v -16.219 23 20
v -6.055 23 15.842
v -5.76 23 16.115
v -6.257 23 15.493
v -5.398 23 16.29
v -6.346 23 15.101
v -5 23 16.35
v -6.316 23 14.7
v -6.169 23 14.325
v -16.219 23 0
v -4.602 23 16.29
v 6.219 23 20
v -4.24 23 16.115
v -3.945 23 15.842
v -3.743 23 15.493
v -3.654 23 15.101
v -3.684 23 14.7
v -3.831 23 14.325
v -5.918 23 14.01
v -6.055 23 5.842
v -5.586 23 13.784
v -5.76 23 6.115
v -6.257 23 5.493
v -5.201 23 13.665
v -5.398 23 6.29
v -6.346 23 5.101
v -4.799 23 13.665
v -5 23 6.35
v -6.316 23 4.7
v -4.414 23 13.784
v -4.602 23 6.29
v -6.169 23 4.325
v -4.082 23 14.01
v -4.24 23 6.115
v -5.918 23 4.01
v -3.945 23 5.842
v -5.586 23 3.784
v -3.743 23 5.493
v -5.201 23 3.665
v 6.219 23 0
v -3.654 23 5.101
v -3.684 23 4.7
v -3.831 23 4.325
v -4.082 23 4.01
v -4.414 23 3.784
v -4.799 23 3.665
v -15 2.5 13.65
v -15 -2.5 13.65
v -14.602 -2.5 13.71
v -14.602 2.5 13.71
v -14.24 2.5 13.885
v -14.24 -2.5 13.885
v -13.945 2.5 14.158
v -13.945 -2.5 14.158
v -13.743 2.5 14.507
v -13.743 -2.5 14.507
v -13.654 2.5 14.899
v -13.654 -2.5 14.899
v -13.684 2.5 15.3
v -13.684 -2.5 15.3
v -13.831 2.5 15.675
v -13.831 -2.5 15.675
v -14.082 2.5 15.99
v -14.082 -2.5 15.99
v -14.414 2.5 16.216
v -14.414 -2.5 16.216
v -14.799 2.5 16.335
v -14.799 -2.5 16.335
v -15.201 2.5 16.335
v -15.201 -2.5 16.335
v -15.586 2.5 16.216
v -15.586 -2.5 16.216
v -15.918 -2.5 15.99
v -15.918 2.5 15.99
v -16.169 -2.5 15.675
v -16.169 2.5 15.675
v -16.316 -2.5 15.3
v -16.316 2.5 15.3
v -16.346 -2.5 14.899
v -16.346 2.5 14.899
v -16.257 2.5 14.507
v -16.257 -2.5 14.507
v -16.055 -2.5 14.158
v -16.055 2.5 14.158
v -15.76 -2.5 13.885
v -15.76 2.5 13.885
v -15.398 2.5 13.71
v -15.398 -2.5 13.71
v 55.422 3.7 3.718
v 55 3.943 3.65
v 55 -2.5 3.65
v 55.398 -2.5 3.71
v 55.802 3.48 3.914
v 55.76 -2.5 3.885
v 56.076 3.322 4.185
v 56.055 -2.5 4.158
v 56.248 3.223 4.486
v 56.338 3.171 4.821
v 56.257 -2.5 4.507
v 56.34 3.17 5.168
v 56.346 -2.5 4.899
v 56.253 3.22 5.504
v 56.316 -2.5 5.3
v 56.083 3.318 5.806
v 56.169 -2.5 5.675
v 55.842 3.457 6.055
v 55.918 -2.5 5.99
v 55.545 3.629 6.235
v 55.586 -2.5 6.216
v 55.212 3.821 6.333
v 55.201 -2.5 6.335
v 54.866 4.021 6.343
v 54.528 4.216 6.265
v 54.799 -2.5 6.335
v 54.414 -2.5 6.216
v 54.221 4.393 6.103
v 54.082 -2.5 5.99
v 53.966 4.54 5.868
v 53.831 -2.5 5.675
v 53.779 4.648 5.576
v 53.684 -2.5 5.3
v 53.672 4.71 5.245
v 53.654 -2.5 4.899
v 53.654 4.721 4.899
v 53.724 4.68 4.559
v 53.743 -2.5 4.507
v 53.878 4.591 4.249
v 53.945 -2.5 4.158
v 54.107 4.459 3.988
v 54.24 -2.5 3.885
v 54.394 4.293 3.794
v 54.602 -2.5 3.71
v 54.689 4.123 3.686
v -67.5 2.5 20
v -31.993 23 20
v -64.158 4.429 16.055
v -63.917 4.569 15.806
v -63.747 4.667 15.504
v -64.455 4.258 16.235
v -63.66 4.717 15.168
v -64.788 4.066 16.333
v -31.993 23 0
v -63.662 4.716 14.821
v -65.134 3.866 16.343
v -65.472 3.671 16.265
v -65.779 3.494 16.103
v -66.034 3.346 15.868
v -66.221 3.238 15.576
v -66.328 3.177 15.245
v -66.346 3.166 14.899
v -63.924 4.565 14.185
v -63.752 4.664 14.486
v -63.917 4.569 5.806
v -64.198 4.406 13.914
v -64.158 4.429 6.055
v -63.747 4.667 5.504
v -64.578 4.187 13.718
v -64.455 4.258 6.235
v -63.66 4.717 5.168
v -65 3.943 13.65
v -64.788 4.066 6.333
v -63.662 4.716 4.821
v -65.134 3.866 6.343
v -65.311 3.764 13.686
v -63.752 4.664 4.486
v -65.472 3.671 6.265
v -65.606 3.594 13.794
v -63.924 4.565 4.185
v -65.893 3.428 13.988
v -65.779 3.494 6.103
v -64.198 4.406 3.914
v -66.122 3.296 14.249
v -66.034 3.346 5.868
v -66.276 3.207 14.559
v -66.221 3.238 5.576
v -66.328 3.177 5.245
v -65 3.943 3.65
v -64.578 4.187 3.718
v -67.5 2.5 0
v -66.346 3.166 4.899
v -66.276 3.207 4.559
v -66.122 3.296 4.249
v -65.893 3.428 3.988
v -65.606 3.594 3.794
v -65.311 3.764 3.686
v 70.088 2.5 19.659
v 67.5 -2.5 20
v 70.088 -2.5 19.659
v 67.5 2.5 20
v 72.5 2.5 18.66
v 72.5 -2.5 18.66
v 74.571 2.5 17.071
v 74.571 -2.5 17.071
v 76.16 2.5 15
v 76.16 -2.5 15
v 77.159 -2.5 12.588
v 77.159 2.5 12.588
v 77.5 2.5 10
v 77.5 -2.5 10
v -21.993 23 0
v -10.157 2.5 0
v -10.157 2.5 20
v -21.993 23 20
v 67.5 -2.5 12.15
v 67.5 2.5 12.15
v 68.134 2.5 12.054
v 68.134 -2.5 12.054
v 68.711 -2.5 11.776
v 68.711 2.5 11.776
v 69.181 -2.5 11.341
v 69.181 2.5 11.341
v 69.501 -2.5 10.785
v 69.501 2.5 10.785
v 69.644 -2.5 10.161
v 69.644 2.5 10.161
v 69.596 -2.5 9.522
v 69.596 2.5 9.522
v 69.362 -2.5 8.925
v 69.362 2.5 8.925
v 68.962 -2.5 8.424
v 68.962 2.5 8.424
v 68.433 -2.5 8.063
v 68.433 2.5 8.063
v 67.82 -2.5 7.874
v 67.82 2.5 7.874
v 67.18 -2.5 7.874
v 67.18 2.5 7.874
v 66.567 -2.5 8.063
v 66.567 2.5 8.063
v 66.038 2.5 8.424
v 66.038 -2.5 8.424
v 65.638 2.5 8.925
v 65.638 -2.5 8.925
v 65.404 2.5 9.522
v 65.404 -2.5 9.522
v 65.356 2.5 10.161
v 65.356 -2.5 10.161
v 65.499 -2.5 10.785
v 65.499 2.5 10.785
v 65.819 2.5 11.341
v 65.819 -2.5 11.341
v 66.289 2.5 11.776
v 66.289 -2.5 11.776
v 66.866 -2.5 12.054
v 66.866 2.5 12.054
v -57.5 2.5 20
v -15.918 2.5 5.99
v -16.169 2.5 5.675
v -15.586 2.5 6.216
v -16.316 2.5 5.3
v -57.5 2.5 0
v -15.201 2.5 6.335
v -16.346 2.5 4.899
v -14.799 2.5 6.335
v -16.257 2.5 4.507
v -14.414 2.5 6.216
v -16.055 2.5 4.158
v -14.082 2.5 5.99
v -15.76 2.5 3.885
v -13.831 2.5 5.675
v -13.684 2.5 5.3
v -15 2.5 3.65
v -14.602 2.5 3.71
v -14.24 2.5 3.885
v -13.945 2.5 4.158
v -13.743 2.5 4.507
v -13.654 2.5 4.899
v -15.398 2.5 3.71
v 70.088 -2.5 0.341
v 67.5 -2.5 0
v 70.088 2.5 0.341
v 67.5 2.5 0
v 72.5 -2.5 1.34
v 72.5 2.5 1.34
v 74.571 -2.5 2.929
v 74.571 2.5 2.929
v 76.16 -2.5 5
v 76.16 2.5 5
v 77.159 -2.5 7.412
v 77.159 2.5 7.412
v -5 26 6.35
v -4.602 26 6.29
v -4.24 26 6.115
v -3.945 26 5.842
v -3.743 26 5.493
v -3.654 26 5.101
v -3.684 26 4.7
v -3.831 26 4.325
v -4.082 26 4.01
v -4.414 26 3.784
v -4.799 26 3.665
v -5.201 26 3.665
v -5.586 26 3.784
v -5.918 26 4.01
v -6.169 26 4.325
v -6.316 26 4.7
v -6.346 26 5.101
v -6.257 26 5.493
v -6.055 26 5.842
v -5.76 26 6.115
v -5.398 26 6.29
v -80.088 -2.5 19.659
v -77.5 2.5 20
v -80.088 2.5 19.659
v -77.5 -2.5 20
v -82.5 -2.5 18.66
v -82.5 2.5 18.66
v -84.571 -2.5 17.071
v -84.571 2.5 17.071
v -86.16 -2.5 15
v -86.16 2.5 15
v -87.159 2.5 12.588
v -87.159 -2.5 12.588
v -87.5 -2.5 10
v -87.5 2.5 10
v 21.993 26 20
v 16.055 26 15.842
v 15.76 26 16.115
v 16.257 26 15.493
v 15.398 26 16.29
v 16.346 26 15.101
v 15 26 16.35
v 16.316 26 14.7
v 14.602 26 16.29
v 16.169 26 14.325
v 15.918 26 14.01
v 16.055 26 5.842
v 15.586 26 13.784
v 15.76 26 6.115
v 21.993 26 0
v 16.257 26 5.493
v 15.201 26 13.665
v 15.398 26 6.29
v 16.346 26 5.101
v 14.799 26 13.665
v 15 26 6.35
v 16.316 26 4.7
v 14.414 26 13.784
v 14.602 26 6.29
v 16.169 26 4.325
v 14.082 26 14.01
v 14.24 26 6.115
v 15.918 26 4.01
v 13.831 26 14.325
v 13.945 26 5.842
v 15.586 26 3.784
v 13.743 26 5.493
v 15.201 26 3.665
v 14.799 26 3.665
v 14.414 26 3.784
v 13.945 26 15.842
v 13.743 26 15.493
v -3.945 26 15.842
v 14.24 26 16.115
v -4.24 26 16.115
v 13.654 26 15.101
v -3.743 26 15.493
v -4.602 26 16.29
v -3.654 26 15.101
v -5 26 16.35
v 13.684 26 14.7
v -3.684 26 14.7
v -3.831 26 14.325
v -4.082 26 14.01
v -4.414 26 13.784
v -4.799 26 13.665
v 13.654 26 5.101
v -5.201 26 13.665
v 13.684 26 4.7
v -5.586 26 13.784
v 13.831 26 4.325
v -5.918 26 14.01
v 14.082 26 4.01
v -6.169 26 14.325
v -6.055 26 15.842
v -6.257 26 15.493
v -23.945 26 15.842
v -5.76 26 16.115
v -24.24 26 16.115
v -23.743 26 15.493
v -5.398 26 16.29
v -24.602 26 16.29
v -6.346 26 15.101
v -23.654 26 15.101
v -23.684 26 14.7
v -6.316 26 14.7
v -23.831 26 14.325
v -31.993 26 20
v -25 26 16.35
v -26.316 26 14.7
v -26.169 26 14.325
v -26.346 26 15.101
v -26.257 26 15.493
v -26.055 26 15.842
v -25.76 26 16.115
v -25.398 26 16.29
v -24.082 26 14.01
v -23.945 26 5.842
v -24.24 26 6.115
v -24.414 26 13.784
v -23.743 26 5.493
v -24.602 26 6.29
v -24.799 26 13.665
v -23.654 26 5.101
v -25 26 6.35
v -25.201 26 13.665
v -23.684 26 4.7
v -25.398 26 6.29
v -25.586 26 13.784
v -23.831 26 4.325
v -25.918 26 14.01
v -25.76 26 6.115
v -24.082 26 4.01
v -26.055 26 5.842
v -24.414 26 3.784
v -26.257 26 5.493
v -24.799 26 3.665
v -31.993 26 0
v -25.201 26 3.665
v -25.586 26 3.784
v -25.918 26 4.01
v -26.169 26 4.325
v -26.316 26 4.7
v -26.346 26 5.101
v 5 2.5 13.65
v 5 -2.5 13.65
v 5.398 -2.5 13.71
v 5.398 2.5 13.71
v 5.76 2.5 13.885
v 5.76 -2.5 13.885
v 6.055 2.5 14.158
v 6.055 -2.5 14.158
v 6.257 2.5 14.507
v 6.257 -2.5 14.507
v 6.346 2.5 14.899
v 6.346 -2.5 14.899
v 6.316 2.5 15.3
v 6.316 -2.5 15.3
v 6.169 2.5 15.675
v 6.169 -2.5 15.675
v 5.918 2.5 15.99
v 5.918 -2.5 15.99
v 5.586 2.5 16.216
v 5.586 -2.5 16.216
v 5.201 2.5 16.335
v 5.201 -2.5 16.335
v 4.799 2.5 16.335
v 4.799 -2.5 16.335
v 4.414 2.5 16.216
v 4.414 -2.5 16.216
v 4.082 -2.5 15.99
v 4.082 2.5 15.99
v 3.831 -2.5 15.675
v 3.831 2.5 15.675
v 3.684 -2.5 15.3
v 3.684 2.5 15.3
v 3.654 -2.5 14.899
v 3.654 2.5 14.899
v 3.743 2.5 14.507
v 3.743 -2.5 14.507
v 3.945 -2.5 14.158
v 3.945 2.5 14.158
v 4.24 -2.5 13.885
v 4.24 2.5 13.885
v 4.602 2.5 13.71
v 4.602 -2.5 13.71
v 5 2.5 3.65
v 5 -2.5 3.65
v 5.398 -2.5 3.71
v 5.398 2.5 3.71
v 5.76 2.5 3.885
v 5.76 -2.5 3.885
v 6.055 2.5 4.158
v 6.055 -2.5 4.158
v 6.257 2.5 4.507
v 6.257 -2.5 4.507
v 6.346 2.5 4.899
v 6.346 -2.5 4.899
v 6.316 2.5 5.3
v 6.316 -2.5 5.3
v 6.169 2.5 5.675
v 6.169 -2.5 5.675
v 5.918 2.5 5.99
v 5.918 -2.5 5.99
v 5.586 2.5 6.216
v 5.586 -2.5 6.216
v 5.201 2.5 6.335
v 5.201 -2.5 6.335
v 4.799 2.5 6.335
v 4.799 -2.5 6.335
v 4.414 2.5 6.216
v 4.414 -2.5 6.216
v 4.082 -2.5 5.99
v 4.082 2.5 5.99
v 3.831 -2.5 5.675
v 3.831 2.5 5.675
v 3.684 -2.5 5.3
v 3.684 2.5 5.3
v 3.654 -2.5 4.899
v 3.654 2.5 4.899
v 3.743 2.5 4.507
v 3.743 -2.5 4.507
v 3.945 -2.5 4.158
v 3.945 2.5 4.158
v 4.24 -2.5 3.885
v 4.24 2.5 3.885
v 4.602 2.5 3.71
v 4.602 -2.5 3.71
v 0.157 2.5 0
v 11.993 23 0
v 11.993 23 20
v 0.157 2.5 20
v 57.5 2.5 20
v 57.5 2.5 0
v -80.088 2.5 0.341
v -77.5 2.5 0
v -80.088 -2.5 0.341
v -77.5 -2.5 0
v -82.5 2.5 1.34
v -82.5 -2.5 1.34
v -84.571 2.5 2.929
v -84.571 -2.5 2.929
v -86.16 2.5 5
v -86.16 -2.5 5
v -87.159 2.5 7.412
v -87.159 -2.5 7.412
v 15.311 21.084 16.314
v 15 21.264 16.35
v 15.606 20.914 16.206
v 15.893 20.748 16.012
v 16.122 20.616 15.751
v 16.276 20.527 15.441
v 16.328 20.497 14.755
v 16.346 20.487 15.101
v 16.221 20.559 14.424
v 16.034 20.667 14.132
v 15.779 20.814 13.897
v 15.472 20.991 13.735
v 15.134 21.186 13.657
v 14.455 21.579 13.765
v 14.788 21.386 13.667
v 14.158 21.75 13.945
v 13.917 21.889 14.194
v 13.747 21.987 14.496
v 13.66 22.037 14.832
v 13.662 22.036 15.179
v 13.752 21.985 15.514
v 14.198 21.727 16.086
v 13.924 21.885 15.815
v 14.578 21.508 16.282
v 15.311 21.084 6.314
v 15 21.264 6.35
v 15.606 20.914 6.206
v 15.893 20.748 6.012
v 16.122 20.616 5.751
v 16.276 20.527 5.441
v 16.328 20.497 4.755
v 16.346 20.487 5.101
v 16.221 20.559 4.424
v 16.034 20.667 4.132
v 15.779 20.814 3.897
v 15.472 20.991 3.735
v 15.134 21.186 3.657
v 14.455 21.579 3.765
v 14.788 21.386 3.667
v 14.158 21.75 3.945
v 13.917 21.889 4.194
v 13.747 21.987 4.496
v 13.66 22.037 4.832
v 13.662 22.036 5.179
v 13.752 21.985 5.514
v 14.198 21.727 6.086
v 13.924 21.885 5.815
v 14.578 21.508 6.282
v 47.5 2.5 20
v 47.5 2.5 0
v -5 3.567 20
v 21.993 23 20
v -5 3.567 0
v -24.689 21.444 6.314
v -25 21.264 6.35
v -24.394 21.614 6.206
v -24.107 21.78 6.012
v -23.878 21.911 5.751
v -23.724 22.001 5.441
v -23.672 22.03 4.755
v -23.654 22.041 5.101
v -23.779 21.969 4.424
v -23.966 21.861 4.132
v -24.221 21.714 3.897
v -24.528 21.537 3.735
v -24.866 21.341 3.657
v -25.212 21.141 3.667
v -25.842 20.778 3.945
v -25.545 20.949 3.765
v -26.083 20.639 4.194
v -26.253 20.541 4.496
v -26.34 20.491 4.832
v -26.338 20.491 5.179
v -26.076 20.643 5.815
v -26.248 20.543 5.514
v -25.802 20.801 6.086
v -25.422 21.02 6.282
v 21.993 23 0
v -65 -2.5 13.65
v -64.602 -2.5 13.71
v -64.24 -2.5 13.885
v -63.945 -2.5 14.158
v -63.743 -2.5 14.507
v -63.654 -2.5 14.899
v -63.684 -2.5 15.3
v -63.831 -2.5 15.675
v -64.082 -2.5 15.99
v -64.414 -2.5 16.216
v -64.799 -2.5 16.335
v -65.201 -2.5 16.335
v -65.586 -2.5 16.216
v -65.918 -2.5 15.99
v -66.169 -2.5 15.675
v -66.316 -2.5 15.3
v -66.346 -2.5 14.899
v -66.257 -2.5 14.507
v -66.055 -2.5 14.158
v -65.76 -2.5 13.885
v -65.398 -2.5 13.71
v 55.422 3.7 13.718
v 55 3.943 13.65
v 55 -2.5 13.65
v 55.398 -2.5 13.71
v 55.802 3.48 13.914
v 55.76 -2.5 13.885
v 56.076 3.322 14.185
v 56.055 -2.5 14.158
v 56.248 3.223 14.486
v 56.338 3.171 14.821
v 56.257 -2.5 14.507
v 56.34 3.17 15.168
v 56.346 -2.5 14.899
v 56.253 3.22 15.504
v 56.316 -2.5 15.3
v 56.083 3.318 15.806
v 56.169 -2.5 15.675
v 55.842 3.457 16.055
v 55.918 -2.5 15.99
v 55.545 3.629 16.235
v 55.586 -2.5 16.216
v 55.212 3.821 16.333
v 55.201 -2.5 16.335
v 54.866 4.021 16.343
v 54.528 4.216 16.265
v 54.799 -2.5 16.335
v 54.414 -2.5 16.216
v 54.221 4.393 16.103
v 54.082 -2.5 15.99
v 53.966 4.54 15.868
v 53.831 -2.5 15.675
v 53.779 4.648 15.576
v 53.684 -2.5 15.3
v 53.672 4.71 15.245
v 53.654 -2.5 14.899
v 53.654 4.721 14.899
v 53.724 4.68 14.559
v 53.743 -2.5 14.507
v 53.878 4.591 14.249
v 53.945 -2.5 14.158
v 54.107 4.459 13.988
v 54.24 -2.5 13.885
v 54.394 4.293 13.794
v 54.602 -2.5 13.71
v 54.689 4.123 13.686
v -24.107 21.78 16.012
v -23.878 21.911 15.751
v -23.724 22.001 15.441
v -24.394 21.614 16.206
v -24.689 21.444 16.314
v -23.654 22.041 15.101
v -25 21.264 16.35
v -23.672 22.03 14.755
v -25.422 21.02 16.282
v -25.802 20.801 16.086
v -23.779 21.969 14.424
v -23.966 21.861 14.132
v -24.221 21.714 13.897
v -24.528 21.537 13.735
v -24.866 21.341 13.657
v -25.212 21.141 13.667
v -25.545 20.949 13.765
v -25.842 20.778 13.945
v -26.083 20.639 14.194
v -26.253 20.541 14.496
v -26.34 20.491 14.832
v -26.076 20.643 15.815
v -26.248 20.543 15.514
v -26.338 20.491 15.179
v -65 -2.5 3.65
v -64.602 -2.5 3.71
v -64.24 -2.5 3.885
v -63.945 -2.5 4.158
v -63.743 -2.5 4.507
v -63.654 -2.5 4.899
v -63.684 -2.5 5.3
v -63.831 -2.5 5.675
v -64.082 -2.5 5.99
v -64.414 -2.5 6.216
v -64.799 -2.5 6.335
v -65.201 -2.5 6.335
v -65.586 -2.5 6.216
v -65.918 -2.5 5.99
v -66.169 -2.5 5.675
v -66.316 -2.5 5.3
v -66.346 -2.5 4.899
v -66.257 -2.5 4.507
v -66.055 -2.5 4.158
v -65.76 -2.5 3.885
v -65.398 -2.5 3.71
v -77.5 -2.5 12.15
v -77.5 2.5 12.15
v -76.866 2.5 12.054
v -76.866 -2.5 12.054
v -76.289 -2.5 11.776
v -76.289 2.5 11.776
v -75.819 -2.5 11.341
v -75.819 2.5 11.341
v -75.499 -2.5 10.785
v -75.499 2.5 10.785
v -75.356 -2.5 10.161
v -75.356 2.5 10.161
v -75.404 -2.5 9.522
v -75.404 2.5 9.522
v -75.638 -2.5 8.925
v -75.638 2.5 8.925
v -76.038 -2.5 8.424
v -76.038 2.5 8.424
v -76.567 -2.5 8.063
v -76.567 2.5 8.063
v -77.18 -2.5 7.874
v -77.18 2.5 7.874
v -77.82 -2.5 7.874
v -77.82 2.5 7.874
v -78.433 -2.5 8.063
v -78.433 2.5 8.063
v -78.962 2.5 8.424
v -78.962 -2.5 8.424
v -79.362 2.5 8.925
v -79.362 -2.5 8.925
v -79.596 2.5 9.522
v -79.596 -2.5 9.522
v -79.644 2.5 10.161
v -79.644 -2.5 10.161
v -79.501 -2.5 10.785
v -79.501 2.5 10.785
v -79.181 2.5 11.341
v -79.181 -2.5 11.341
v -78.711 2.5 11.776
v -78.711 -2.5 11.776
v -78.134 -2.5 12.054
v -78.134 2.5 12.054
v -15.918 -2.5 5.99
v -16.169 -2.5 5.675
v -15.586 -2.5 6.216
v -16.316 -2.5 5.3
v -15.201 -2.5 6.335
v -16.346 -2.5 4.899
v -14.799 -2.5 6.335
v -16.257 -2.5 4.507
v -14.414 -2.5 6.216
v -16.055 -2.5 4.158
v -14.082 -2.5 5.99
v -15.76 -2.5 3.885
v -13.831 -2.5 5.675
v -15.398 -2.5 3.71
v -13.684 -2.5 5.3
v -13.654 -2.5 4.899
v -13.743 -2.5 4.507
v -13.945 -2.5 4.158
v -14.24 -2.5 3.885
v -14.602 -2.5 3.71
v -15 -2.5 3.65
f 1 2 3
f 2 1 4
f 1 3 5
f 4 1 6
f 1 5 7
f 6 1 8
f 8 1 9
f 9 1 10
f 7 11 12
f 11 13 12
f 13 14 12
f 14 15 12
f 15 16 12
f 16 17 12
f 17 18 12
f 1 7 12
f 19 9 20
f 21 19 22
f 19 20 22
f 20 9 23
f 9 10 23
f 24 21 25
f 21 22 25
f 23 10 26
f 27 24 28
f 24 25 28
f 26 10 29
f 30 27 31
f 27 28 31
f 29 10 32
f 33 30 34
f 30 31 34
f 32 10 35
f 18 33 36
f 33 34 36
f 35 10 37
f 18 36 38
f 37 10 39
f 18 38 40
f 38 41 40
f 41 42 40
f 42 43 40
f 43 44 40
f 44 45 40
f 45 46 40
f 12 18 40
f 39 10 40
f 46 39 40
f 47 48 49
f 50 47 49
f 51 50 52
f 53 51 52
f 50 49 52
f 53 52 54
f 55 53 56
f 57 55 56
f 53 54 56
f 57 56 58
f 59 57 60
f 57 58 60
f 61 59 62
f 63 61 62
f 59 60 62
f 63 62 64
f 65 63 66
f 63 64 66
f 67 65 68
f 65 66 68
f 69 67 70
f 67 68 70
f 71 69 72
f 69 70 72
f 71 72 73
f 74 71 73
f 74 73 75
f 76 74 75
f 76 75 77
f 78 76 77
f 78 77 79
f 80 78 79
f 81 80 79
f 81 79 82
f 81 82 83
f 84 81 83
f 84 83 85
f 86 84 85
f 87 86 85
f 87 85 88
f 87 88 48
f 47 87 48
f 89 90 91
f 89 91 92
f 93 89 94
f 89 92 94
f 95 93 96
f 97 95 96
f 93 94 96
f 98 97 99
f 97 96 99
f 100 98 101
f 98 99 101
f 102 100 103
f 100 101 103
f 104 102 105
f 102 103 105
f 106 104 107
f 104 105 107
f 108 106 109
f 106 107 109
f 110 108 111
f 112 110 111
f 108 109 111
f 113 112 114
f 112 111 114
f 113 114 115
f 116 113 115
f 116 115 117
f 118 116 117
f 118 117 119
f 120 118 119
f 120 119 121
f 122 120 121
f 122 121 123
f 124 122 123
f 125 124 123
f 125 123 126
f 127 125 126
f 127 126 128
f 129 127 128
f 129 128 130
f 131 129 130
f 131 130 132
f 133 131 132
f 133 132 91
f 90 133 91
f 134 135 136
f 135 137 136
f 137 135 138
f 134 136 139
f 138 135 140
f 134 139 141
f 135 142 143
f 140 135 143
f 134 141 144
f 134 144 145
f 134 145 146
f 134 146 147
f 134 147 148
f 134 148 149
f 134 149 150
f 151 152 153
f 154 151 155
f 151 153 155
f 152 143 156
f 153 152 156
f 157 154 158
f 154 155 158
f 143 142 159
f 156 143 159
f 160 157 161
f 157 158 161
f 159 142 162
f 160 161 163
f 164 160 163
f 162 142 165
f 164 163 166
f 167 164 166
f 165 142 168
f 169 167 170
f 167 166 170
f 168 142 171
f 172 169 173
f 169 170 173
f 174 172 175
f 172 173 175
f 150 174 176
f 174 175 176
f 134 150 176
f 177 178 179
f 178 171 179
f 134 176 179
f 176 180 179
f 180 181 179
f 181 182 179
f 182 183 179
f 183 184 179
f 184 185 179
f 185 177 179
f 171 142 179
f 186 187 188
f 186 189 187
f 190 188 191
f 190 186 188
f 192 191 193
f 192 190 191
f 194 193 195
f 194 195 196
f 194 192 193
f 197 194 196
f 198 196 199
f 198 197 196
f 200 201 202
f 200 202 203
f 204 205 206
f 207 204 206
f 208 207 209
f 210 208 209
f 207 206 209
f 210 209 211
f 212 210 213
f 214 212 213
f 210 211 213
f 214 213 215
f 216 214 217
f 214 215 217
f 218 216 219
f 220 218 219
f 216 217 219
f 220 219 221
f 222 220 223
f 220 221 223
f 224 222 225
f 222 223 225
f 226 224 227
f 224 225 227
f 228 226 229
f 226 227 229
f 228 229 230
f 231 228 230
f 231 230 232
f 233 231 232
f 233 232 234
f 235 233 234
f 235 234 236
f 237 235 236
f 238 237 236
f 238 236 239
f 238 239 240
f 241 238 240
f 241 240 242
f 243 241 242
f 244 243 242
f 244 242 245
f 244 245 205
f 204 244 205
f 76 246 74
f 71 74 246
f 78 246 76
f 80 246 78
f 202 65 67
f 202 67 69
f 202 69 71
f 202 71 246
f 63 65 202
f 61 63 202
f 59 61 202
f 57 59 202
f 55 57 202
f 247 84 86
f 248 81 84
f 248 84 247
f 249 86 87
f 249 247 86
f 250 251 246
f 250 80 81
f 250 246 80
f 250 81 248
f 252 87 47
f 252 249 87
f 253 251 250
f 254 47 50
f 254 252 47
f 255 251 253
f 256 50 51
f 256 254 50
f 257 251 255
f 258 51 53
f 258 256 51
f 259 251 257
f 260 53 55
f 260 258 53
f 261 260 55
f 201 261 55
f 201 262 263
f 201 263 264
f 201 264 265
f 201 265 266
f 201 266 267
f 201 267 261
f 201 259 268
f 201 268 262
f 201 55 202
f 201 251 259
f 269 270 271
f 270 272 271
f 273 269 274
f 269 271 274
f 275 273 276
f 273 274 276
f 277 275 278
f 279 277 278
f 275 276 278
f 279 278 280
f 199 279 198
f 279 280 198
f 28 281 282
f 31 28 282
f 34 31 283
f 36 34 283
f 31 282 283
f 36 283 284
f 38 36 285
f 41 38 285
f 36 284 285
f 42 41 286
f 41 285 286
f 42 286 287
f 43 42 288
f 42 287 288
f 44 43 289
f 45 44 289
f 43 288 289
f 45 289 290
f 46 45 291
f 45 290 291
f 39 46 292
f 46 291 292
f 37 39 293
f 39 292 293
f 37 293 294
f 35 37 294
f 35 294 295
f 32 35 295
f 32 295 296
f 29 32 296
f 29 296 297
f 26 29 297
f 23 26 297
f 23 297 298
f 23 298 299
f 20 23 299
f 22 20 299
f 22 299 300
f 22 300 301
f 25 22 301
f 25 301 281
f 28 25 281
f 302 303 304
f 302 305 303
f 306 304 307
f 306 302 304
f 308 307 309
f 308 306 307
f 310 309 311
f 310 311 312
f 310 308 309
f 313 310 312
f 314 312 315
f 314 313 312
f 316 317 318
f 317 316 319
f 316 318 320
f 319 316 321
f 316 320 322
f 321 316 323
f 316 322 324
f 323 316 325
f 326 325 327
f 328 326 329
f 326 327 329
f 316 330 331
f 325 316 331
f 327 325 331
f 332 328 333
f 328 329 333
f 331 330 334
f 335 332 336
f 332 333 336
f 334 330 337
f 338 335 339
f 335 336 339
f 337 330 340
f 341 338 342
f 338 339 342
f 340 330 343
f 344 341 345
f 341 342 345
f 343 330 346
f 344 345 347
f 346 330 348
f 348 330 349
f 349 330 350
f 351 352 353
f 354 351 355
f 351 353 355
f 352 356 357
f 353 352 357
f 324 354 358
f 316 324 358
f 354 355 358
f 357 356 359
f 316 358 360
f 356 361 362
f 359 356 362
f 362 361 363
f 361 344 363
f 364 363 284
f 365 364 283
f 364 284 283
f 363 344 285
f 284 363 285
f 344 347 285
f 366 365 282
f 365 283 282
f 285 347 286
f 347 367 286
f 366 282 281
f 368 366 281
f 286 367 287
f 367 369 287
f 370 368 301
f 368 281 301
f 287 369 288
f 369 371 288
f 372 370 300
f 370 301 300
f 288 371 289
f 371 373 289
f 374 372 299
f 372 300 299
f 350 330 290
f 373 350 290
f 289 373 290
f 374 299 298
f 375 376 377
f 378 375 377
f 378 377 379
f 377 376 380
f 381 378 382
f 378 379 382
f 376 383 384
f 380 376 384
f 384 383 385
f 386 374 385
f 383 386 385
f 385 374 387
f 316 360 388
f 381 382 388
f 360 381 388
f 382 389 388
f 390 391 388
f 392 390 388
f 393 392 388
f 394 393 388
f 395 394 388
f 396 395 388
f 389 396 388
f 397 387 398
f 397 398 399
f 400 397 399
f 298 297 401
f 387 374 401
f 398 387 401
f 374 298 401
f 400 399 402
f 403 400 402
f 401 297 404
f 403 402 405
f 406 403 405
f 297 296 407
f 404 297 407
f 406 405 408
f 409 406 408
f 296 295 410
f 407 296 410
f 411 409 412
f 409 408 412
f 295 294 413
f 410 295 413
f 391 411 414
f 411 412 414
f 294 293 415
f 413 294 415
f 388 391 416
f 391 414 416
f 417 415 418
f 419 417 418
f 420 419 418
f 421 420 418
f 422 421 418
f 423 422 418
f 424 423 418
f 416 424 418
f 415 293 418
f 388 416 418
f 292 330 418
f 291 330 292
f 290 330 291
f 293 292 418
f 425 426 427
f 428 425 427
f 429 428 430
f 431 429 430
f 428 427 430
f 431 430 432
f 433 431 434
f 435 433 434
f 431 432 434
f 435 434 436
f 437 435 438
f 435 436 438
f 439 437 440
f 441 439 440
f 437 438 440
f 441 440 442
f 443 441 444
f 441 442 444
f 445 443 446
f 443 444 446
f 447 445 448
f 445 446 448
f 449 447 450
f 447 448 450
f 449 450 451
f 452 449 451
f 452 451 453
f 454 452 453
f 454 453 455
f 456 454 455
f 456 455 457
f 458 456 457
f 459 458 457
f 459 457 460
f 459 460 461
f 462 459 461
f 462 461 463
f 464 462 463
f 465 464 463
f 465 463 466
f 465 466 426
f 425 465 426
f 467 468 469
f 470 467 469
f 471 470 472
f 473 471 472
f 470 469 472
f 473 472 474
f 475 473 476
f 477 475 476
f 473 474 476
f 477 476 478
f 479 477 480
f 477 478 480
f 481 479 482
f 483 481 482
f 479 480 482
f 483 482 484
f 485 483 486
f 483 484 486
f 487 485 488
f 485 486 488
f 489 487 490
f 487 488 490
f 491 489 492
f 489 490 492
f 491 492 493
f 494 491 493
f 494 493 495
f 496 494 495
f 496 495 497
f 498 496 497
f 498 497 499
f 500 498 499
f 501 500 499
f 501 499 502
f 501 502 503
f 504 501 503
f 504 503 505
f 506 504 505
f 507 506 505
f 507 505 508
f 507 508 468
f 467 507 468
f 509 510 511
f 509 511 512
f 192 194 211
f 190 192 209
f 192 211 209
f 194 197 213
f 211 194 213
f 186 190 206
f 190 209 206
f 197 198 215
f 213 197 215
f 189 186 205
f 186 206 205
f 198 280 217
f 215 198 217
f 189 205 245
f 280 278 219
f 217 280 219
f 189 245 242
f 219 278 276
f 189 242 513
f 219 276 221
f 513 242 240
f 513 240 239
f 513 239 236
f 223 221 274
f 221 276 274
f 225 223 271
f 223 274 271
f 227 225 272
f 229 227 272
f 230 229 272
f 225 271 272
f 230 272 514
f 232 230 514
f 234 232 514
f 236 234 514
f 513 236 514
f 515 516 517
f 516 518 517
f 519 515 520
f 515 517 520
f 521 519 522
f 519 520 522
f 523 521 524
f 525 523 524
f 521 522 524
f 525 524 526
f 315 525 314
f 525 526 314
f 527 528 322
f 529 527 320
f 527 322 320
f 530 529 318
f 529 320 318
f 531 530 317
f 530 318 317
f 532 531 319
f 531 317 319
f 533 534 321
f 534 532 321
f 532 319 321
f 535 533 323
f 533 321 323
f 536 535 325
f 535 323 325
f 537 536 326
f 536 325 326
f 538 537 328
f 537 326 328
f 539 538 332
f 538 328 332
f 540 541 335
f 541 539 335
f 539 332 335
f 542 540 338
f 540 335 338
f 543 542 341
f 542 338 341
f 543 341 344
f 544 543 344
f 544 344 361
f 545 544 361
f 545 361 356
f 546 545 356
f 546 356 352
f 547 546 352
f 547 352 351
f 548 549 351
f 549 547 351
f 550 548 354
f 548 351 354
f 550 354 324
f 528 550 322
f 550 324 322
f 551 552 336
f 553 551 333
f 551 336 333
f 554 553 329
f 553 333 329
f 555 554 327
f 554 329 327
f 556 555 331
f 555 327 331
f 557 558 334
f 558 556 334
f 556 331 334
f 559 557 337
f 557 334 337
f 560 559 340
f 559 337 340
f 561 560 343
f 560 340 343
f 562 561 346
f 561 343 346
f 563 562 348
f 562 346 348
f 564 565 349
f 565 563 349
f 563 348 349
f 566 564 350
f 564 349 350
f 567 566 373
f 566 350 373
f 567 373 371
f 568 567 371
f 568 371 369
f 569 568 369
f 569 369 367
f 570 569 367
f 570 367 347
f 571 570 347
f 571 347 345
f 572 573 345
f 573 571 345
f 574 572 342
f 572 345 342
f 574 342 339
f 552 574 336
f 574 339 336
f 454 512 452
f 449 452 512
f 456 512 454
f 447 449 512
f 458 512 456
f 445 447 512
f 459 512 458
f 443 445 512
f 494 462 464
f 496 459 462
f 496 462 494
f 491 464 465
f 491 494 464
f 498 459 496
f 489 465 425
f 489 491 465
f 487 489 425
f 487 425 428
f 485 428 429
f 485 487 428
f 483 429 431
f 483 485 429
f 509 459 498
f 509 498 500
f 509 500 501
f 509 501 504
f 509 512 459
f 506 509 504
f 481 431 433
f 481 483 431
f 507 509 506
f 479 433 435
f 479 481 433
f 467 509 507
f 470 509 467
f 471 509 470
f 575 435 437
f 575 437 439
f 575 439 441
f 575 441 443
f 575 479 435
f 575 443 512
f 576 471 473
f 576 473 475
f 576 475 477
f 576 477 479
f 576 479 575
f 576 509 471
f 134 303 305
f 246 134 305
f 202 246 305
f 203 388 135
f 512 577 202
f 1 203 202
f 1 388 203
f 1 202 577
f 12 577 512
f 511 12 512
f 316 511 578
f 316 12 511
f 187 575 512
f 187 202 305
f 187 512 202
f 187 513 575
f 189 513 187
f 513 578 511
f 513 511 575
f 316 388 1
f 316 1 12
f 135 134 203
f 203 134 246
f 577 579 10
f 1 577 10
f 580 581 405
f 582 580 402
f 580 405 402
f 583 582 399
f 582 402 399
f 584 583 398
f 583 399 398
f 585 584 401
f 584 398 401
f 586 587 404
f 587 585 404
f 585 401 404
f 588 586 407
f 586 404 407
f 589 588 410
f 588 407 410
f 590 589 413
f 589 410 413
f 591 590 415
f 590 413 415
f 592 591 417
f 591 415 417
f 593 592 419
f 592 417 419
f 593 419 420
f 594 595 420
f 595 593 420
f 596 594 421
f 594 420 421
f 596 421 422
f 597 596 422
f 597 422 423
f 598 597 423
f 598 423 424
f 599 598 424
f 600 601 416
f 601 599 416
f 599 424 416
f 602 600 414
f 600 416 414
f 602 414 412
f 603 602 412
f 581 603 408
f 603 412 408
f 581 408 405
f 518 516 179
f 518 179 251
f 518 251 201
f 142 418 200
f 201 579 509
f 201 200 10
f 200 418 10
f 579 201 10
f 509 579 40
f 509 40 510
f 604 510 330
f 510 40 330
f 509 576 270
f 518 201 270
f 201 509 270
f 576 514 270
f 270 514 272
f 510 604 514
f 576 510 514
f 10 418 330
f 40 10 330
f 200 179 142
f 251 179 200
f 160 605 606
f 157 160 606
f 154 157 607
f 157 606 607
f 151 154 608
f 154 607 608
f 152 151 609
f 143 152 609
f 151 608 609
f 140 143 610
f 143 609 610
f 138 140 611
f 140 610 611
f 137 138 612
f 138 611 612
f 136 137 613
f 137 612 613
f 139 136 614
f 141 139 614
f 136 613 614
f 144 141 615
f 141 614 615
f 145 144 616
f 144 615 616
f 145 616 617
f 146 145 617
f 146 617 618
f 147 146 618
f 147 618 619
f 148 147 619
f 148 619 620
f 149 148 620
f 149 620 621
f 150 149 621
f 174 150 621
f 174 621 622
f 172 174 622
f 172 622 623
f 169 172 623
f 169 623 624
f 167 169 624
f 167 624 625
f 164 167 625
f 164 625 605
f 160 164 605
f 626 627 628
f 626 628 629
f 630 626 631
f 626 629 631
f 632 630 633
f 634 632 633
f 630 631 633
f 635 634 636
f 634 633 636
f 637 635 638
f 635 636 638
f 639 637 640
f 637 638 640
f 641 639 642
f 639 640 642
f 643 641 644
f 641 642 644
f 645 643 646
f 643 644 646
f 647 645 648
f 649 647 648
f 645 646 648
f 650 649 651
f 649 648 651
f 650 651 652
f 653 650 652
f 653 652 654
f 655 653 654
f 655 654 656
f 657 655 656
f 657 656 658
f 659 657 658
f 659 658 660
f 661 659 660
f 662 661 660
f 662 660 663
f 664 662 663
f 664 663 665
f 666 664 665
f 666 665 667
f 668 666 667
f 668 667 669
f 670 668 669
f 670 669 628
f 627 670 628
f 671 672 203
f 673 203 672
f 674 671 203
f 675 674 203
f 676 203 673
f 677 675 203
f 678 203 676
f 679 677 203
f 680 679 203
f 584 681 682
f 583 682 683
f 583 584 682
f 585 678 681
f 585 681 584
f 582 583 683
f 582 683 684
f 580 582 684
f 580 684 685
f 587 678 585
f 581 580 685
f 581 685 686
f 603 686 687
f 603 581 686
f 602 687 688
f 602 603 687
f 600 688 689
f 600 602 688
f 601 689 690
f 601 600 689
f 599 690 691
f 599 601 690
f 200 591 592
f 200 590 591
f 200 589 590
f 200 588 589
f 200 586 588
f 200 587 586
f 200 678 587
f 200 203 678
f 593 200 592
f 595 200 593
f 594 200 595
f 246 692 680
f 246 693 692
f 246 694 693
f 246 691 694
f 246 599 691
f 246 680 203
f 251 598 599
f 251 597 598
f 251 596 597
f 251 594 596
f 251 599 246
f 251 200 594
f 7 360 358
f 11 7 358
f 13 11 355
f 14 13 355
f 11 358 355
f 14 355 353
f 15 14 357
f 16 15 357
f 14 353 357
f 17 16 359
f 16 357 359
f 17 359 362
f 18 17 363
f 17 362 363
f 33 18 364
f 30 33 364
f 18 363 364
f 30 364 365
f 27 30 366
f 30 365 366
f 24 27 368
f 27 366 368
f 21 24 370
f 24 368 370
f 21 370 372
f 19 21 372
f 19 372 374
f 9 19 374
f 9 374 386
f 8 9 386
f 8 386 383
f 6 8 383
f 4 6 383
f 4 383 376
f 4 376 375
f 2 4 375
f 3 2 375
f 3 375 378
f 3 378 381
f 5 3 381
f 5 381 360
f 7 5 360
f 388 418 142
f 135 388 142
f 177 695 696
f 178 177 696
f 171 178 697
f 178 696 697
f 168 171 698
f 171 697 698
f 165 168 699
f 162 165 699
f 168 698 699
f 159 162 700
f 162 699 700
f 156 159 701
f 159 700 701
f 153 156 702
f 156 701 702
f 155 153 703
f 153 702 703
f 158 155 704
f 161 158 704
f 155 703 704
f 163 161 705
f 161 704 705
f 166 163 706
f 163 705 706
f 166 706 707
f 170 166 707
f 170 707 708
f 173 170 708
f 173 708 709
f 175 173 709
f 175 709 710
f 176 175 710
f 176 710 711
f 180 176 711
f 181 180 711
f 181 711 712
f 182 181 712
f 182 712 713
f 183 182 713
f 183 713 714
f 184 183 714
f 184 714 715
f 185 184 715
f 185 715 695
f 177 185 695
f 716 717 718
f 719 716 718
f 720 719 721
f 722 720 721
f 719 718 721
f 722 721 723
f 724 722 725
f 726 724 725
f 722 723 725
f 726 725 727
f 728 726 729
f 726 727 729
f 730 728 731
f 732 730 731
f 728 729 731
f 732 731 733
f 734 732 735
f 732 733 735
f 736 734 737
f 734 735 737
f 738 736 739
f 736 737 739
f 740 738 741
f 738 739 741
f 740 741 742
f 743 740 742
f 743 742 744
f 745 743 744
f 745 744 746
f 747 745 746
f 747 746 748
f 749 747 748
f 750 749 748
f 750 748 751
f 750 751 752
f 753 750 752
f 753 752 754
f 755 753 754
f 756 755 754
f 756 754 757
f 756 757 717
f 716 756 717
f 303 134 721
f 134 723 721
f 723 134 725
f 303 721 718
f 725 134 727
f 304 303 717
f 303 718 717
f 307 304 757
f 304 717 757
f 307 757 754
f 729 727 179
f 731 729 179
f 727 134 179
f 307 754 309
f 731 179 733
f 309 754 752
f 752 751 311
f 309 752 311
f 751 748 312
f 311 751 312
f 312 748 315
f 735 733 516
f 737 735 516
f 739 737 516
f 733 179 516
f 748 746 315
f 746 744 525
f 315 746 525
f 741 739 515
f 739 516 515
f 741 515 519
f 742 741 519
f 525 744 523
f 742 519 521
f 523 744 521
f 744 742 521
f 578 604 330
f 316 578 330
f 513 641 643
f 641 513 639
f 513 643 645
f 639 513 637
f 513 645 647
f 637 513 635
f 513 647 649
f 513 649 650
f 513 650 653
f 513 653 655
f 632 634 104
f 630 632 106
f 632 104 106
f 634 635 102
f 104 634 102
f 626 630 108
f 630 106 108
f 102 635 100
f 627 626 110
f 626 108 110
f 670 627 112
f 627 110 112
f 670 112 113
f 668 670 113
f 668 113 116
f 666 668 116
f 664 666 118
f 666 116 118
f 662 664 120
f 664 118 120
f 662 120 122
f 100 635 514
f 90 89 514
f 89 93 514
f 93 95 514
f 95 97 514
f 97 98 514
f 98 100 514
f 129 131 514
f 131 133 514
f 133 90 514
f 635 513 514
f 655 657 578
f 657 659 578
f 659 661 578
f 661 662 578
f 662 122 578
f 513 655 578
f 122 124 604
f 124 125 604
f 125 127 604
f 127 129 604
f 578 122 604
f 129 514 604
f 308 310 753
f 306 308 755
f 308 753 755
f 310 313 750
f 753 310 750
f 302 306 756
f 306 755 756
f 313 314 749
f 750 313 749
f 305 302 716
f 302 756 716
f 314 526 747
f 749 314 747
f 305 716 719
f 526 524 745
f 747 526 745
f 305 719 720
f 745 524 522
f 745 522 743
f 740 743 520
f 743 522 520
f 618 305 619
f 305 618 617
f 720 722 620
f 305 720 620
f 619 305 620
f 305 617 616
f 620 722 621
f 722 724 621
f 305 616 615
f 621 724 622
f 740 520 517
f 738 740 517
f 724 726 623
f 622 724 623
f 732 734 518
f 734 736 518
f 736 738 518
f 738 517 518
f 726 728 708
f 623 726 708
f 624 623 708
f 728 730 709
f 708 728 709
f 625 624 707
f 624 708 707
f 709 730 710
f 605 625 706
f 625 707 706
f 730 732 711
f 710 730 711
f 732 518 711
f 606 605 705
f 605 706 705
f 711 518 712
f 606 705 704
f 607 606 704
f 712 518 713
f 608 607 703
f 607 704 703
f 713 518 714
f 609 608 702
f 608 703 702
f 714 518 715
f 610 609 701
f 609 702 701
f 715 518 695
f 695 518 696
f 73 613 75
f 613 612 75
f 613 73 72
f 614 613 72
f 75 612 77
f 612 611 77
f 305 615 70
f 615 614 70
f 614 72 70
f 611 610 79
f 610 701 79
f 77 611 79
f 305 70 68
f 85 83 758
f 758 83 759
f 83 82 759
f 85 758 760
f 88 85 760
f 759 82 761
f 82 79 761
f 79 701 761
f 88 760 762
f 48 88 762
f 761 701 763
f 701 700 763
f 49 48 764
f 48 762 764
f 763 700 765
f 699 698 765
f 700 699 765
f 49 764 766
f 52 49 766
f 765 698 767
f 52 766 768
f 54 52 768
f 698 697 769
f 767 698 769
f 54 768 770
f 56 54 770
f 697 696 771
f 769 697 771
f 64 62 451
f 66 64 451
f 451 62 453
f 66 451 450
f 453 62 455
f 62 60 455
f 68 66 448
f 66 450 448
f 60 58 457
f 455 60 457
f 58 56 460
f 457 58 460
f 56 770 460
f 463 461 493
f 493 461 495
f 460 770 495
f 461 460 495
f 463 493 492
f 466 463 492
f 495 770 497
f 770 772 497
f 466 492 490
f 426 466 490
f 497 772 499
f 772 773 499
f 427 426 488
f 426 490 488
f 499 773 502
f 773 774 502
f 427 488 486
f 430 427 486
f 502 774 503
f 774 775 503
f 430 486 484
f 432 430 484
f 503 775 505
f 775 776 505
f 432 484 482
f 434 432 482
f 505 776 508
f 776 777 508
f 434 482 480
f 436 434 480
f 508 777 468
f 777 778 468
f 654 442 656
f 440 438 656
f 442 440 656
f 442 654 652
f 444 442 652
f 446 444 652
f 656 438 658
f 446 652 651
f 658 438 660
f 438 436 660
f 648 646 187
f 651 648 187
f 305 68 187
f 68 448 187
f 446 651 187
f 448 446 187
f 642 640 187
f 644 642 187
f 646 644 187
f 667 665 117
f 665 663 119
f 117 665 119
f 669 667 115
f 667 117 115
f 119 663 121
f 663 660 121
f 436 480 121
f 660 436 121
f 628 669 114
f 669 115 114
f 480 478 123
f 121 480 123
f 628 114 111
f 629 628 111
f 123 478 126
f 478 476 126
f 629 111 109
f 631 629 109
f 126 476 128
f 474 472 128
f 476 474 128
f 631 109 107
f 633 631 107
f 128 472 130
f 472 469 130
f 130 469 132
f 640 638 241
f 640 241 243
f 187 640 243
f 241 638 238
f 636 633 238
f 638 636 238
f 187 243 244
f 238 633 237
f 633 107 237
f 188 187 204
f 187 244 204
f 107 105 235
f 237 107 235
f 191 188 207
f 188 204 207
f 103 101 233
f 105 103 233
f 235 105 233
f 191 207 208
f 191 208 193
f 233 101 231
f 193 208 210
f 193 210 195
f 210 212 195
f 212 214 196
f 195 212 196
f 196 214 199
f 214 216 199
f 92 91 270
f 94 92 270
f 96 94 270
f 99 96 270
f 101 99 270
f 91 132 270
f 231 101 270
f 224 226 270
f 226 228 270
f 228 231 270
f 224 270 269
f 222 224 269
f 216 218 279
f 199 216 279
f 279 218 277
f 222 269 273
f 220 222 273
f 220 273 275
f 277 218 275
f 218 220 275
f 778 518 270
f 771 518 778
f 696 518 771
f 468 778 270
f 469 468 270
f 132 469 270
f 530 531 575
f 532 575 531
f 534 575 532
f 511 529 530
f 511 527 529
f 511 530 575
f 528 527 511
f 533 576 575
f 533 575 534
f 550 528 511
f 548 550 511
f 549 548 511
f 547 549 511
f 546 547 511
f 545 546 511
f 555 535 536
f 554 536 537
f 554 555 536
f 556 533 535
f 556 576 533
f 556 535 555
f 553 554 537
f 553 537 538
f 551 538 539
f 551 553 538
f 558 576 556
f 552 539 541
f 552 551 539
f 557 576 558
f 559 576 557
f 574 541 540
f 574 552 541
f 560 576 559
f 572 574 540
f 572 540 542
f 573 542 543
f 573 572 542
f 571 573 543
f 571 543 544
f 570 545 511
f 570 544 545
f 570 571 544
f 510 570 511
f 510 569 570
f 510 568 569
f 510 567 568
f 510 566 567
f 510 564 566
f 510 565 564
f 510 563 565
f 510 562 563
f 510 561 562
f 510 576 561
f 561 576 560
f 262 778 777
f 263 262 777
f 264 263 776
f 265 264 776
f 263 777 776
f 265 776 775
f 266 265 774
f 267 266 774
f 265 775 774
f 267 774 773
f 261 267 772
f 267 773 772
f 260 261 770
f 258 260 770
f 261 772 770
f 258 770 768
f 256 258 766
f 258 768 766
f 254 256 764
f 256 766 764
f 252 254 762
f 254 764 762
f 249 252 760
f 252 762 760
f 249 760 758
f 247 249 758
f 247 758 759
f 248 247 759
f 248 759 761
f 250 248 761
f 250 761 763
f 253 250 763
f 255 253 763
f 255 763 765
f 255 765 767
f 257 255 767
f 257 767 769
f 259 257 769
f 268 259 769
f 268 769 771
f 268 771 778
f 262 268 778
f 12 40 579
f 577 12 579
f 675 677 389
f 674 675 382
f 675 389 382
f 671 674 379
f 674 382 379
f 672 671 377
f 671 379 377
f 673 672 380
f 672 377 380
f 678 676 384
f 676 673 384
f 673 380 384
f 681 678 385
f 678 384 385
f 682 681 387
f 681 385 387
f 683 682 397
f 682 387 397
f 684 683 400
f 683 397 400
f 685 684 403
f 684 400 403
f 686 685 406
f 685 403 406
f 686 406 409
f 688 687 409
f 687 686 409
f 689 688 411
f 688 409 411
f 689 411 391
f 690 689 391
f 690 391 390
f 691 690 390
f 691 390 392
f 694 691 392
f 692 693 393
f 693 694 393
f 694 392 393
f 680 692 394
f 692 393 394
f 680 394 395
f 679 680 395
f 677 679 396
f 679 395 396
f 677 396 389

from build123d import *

# Parameters (mm, degrees)
EXTRUDE_1_DEPTH     = 20
SKETCH_2_R          = 2.15
CUT_EXTRUDE_1_DEPTH = 20
SKETCH_3_R          = 1.35
CUT_EXTRUDE_2_DEPTH = 10
FILLET_1_R          = 10
SKETCH_4_R          = 1.35
CUT_EXTRUDE_3_DEPTH = 10


with BuildPart() as part:
    # 스케치1 → 보스-돌출1 (new body)
    with BuildSketch(Plane.XY):
        Polygon((-31.992958445, 23), (-67.5, 2.5), (-87.5, 2.5), (-87.5, -2.5), (77.5, -2.5), (77.5, 2.5), (57.5, 2.5), (21.992958445, 23), (21.992958445, 26), (-31.992958445, 26), align=None)
        Polygon((0.157277926, 2.5), (47.5, 2.5), (11.992958445, 23), align=None, mode=Mode.SUBTRACT)
        Polygon((-16.219455753, 23), (6.219455753, 23), (-5, 3.567332603), align=None, mode=Mode.SUBTRACT)
        Polygon((-21.992958445, 23), (-57.5, 2.5), (-10.157277926, 2.5), align=None, mode=Mode.SUBTRACT)
    extrude(amount=EXTRUDE_1_DEPTH)

    # 스케치2 → 컷-돌출1 (cut)
    with BuildSketch(Plane(origin=(0, 2.5, 0), x_dir=(1, 0, 0), z_dir=(0, 1, 0))):
        with Locations(Location((-77.5, -10, 0), (0, 0, 270))):
            Circle(SKETCH_2_R)
        with Locations(Location((67.5, -10, 0), (0, 0, 270))):
            Circle(SKETCH_2_R)
    extrude(amount=-CUT_EXTRUDE_1_DEPTH, mode=Mode.SUBTRACT)

    # 스케치3 → 컷-돌출2 (cut)
    with BuildSketch(Plane(origin=(0, 26, 0), x_dir=(1, 0, 0), z_dir=(0, 1, 0))):
        with Locations(Location((-25, -5, 0), (0, 0, 270))):
            Circle(SKETCH_3_R)
        with Locations(Location((-25, -15, 0), (0, 0, 270))):
            Circle(SKETCH_3_R)
        with Locations(Location((-5, -5, 0), (0, 0, 270))):
            Circle(SKETCH_3_R)
        with Locations(Location((-5, -15, 0), (0, 0, 270))):
            Circle(SKETCH_3_R)
        with Locations(Location((15, -5, 0), (0, 0, 270))):
            Circle(SKETCH_3_R)
        with Locations(Location((15, -15, 0), (0, 0, 270))):
            Circle(SKETCH_3_R)
    extrude(amount=-CUT_EXTRUDE_2_DEPTH, mode=Mode.SUBTRACT)

    # 필렛1
    fillet_1_edges = [part.edges().sort_by_distance(p)[0] for p in [
        (77.5, 0, 0),
        (77.5, 0, 20),
        (-87.5, 0, 0),
        (-87.5, 0, 20),
    ]]
    fillet(fillet_1_edges, radius=FILLET_1_R - 0.0001)  # a hair under: the kernel refuses the full size

    # 스케치4 → 컷-돌출3 (cut)
    with BuildSketch(Plane.XZ.offset(2.5)):
        with Locations(Location((-65, 15, 0), (0, 0, 270))):
            Circle(SKETCH_4_R)
        with Locations(Location((-65, 5, 0), (0, 0, 270))):
            Circle(SKETCH_4_R)
        with Locations(Location((55, 5, 0), (0, 0, 270))):
            Circle(SKETCH_4_R)
        with Locations(Location((55, 15, 0), (0, 0, 270))):
            Circle(SKETCH_4_R)
        with Locations(Location((-15, 15, 0), (0, 0, 270))):
            Circle(SKETCH_4_R)
        with Locations(Location((5, 15, 0), (0, 0, 270))):
            Circle(SKETCH_4_R)
        with Locations(Location((-15, 5, 0), (0, 0, 270))):
            Circle(SKETCH_4_R)
        with Locations(Location((5, 5, 0), (0, 0, 270))):
            Circle(SKETCH_4_R)
    extrude(amount=-CUT_EXTRUDE_3_DEPTH, mode=Mode.SUBTRACT)


solid = part.part
